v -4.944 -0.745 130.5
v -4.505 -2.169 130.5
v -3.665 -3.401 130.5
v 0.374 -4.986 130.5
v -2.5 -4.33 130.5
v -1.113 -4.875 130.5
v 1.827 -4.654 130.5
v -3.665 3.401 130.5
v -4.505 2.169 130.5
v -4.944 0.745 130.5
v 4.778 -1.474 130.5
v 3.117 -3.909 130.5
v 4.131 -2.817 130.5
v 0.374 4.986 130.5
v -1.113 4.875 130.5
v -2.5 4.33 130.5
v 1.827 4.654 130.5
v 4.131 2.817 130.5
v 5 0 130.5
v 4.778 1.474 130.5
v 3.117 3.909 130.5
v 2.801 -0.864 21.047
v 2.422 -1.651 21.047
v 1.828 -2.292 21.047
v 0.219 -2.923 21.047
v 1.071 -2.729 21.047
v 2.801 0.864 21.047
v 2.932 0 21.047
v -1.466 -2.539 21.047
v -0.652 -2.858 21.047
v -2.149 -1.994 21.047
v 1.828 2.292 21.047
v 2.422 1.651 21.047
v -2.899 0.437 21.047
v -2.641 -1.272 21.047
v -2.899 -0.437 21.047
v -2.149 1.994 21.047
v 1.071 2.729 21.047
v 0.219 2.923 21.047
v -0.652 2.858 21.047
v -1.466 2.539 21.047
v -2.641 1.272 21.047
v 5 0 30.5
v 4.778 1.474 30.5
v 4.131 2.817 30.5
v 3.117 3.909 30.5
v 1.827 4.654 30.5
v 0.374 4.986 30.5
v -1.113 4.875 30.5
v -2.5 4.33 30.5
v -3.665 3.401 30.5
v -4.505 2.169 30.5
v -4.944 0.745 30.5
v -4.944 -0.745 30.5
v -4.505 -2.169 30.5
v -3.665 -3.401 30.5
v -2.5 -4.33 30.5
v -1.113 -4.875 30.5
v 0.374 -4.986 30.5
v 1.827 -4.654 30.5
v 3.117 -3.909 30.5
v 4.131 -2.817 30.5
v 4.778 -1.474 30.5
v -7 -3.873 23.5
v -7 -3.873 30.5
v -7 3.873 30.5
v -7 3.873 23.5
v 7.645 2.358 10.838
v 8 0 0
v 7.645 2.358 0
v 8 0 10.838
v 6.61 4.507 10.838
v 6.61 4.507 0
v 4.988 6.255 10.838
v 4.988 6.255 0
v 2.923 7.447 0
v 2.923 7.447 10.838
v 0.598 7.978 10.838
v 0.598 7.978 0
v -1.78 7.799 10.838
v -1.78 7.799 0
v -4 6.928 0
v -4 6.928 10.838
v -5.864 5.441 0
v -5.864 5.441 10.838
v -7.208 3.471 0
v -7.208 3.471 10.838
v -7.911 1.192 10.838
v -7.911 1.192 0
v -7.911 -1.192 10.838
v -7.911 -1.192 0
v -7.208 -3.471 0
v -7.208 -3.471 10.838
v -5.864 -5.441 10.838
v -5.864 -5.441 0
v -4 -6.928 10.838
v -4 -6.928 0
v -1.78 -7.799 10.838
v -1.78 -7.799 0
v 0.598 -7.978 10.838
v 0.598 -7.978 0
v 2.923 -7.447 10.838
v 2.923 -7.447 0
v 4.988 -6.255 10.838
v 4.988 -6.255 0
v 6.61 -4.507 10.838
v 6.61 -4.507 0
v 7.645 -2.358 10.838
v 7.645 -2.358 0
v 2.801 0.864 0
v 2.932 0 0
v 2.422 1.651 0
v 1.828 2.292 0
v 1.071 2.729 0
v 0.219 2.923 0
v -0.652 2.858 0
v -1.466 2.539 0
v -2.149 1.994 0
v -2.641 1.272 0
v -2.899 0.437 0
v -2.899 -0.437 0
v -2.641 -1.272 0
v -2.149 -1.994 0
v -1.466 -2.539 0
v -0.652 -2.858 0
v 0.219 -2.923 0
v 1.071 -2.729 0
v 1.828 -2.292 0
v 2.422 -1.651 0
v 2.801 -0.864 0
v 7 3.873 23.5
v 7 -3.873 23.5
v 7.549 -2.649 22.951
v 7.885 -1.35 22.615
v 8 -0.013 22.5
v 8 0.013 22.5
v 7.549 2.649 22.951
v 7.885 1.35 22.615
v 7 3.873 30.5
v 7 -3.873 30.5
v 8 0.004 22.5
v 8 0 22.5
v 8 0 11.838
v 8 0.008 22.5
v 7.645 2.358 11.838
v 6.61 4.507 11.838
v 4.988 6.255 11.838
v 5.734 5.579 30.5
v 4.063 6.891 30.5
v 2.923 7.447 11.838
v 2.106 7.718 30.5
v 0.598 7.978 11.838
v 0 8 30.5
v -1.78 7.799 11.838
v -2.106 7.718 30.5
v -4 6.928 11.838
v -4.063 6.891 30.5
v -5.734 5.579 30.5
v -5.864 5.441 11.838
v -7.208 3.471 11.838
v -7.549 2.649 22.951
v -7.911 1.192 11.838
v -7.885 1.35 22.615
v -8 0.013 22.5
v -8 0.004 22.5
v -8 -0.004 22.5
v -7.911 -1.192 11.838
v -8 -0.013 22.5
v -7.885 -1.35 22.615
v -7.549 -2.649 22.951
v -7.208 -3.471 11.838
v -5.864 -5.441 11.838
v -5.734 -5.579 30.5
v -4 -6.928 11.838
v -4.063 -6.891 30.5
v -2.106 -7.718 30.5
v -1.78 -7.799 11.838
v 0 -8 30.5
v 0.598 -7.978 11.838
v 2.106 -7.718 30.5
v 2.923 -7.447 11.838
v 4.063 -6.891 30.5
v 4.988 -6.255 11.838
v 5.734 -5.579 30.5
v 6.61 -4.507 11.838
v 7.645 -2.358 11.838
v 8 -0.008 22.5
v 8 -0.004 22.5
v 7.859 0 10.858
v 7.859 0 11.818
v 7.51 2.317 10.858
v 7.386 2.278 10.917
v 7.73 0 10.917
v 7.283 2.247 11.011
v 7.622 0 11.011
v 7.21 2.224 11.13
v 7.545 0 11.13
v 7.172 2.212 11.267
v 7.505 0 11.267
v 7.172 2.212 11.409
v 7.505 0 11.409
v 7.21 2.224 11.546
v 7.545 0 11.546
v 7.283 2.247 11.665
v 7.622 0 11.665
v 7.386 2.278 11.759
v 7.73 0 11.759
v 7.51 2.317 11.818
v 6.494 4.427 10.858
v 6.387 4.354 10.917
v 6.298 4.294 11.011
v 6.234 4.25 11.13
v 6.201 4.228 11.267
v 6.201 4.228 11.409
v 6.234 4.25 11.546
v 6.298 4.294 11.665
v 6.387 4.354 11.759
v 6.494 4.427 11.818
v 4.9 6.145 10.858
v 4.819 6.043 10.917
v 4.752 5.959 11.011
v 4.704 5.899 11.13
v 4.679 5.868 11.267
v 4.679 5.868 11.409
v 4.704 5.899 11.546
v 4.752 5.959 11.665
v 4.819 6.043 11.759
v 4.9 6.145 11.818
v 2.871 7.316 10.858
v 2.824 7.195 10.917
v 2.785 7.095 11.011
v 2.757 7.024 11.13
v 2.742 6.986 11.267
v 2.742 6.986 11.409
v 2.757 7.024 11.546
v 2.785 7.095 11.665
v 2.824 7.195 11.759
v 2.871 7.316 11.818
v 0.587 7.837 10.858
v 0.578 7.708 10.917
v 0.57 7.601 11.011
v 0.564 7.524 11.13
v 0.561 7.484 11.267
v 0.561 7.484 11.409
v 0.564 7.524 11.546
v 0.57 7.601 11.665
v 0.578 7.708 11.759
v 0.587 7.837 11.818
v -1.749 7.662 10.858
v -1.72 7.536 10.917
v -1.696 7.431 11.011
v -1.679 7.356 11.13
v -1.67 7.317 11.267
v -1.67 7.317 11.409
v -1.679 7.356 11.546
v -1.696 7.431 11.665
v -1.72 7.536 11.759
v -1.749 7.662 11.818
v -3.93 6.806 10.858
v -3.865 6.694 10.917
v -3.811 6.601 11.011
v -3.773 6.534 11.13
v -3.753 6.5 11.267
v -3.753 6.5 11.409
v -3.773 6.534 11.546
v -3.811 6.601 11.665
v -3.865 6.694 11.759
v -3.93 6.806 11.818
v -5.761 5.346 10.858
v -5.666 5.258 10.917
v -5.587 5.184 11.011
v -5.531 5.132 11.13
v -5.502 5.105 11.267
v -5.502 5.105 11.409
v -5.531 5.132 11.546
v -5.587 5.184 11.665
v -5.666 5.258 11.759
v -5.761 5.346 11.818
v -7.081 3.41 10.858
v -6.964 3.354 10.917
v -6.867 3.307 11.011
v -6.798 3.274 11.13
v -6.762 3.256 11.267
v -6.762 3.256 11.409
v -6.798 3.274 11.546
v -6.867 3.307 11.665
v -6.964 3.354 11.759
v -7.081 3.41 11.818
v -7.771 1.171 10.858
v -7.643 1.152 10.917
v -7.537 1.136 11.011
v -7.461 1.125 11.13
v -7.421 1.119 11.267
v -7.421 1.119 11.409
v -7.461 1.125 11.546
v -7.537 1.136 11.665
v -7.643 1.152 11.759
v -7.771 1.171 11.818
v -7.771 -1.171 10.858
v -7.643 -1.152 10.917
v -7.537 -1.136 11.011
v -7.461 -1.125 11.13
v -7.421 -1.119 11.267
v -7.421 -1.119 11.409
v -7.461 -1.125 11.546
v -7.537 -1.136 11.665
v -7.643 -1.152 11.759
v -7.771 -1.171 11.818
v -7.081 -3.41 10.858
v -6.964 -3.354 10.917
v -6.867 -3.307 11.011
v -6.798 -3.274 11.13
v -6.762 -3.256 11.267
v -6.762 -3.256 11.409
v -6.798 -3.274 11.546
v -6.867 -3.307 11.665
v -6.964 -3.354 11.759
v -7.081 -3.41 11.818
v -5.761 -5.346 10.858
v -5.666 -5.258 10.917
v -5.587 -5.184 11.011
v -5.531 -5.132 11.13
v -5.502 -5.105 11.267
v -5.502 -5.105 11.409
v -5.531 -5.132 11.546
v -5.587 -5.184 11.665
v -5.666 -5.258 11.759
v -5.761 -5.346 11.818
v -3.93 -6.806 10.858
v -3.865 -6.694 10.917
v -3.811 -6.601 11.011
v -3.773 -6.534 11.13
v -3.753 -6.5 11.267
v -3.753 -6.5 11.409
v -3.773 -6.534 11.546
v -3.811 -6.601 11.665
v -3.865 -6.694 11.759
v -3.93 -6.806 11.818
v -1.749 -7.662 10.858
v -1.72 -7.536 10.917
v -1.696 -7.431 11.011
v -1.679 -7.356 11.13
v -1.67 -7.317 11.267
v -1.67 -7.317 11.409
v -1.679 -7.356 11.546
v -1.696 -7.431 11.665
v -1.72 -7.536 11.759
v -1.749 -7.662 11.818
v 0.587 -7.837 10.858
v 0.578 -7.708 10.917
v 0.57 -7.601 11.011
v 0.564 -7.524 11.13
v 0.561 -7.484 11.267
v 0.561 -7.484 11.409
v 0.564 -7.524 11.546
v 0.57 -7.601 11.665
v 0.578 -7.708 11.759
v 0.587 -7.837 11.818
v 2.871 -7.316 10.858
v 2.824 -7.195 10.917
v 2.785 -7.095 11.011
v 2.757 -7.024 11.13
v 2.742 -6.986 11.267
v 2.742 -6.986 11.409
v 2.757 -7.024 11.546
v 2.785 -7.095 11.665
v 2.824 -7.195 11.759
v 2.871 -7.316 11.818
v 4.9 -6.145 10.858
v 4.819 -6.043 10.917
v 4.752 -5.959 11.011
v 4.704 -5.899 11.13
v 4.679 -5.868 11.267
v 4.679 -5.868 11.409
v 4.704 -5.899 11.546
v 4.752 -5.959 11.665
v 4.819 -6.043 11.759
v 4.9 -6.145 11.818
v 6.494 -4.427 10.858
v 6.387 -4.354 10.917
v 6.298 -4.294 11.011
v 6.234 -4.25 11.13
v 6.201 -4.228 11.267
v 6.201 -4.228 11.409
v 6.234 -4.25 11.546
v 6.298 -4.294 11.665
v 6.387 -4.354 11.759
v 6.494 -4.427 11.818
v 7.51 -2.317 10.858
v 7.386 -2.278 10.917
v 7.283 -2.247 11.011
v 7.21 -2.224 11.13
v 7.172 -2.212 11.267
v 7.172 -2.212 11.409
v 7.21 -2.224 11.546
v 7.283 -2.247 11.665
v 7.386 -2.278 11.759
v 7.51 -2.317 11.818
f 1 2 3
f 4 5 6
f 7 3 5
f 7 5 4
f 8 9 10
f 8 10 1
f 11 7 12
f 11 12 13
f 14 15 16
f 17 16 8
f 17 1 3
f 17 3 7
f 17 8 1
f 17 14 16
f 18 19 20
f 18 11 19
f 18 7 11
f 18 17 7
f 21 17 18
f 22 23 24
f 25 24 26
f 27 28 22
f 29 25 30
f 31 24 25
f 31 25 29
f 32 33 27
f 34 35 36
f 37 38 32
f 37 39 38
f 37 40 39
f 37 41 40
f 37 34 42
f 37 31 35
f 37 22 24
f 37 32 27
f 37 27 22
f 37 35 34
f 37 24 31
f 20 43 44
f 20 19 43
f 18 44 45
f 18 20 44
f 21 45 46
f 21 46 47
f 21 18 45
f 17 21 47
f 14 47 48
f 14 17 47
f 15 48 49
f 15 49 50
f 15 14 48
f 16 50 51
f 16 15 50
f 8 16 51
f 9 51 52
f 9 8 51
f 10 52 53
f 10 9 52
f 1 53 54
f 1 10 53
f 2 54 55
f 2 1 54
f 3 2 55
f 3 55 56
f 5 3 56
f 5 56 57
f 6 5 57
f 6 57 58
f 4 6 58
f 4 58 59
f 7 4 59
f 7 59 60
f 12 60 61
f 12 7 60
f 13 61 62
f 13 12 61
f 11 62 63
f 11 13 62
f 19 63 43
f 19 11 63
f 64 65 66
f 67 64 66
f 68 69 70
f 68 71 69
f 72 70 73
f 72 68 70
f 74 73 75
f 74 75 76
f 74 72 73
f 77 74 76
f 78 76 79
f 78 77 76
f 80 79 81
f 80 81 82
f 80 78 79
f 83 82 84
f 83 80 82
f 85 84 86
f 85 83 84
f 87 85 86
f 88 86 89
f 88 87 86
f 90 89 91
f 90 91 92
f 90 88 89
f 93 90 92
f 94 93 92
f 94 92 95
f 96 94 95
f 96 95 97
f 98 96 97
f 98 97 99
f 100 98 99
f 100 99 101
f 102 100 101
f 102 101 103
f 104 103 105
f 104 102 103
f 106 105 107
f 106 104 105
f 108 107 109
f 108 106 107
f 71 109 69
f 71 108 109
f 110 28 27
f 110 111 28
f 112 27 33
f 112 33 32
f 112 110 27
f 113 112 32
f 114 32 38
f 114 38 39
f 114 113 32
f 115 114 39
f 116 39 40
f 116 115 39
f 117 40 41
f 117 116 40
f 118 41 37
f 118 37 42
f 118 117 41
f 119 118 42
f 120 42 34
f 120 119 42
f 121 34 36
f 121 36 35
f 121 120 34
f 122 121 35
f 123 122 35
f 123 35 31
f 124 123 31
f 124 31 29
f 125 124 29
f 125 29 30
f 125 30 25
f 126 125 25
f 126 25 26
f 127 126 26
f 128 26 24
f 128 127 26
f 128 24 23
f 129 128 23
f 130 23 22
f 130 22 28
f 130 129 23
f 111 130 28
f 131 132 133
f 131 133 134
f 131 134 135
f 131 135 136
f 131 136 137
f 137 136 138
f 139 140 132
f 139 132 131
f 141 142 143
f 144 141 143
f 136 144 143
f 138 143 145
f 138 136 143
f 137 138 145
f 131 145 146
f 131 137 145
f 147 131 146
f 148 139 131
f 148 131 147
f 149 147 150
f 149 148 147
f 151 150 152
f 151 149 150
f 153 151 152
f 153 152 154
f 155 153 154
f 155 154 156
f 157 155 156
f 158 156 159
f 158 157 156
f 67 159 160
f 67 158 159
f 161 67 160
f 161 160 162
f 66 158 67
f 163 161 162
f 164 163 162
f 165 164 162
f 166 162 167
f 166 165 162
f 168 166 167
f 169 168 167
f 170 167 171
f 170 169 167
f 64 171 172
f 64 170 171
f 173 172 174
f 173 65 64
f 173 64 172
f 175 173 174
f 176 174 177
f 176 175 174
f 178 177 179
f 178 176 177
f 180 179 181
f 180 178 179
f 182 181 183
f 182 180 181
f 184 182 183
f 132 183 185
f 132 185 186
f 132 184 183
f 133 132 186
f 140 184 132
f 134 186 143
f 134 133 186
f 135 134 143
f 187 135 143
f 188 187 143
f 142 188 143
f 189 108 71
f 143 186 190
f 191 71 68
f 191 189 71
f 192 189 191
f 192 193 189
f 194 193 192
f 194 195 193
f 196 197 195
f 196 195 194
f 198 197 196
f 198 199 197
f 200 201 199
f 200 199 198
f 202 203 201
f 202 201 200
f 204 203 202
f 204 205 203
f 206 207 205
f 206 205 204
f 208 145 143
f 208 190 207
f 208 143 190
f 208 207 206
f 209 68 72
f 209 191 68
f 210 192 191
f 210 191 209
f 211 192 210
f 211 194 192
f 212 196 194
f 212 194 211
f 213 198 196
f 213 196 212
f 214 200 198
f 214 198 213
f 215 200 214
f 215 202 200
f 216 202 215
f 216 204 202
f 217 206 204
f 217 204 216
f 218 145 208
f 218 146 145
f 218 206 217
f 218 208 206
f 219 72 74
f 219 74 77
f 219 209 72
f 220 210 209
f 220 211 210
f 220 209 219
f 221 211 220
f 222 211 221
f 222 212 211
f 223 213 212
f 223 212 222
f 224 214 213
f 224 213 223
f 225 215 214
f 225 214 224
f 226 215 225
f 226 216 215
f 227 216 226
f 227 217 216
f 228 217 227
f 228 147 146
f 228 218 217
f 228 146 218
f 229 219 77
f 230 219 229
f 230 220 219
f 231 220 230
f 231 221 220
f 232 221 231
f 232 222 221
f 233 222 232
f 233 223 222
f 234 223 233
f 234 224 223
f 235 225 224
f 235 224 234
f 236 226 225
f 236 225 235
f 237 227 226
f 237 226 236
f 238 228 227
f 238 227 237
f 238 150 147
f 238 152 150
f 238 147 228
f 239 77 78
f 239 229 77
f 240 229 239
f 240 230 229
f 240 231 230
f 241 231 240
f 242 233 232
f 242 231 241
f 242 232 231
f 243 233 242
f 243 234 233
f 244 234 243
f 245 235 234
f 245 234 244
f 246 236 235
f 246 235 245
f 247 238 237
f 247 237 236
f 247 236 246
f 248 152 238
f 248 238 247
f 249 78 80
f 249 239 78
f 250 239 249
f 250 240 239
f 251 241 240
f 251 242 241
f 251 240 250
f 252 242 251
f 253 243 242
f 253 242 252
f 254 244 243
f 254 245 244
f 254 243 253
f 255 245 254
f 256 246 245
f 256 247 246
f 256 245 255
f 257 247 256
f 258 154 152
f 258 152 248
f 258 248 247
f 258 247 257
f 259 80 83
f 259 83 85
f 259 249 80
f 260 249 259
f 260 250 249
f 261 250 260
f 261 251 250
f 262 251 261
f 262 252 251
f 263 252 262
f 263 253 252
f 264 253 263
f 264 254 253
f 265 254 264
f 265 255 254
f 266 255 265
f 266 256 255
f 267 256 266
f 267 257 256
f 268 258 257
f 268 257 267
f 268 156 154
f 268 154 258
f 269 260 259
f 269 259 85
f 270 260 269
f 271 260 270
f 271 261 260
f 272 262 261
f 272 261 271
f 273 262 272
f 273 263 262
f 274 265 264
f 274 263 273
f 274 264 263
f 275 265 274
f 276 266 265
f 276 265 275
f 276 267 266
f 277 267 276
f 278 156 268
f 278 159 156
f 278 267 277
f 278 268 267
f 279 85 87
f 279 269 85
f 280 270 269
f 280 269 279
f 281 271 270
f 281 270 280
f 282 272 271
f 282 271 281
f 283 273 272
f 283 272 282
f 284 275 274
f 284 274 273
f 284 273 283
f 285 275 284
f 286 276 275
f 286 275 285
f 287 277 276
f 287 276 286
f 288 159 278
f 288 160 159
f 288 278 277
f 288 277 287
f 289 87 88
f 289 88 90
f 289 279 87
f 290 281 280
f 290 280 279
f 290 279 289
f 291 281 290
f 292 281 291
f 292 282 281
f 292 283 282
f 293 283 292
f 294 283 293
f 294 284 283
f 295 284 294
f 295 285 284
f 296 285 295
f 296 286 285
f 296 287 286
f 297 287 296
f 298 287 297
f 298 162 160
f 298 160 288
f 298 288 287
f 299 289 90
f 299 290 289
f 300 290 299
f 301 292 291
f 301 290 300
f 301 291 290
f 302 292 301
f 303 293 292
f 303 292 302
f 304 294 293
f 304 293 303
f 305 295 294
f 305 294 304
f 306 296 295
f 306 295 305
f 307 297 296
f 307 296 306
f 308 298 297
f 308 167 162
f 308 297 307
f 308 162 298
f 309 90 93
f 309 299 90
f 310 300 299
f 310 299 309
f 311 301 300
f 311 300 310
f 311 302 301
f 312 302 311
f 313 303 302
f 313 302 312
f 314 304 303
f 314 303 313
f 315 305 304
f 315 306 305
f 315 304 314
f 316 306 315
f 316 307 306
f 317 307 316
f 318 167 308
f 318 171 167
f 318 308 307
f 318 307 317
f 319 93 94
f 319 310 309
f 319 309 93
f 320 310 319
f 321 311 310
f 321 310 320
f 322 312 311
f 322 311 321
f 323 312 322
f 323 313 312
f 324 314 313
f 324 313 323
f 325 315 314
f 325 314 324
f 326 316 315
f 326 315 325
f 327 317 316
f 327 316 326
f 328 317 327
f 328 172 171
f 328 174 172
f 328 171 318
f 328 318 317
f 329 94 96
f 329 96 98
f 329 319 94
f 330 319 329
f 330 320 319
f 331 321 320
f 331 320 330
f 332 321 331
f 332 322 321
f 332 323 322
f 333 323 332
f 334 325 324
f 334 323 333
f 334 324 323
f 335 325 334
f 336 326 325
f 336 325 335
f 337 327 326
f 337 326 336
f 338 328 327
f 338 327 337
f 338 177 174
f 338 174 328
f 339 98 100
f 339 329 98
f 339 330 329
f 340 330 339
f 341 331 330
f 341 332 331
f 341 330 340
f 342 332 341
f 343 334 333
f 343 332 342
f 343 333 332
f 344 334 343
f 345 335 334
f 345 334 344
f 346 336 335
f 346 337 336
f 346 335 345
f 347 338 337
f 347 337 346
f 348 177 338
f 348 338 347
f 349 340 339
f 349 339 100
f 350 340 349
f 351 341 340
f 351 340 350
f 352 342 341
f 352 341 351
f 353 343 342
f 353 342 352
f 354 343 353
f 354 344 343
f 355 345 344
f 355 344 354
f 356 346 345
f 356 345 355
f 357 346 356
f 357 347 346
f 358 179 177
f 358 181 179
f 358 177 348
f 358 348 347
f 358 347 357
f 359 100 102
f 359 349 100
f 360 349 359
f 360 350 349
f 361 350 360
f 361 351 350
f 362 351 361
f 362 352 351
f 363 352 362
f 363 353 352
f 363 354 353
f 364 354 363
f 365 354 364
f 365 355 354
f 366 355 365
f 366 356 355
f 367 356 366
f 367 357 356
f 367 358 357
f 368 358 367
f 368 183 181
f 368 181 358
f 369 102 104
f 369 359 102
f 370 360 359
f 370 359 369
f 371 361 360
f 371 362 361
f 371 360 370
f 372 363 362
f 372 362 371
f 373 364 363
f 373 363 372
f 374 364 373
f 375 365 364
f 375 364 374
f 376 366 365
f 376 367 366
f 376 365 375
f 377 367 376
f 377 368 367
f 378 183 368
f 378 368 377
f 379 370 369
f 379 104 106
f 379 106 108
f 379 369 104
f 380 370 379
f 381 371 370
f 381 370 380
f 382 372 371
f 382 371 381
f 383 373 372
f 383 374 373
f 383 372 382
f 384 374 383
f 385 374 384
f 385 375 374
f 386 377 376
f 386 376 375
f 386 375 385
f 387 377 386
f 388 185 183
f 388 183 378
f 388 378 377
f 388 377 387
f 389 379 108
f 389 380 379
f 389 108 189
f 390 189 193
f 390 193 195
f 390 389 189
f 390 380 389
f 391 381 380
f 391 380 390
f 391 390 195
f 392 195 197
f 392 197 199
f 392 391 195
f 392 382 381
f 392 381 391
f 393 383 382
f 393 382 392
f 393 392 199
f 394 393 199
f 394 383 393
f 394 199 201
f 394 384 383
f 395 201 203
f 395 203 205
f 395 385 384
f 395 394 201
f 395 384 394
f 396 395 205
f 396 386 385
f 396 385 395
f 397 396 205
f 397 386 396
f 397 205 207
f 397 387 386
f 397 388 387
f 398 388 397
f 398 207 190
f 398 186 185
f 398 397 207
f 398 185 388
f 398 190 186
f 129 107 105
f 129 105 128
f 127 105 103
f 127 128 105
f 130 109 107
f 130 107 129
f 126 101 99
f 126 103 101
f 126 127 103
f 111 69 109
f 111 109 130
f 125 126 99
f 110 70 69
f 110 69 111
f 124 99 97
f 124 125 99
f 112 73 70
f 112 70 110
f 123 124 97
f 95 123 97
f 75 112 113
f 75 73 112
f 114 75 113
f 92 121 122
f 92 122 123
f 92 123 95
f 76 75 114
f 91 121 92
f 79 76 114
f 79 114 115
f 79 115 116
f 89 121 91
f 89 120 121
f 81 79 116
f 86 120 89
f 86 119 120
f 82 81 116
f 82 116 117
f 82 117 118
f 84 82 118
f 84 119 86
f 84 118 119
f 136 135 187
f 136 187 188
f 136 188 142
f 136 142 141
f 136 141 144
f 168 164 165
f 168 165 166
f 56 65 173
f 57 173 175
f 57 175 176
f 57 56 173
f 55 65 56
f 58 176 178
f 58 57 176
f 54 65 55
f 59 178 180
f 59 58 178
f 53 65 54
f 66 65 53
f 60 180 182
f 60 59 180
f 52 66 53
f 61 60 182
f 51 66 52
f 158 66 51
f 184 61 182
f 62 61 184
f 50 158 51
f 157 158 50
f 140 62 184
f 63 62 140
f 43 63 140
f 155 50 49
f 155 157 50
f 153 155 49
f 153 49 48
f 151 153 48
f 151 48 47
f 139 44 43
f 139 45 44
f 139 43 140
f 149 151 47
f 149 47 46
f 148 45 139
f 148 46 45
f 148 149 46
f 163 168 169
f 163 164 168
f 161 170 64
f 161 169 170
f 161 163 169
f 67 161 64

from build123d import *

# Parameters (mm, degrees)
F2_W     = 19.6017324924
F2_H     = 37.1457748115
F2_W_2   = 14
F2_H_2   = 30
F3_DEPTH = 8
F4_SIZE  = 0.99999


# Not quite as in the source:
# - a fillet or chamfer is up to 0.001 mm smaller than in the source, because OpenCascade refuses the exact size


with BuildPart() as f1:
    # F0 (on Front) → F1 (revolve)
    with BuildSketch(Plane.XZ):
        with BuildLine():
            Line((2.9315422289, 21.0469197482), (2.9315422289, 0))
            Line((2.9315422289, 0), (8, 0))
            Line((8, 0), (8, 10.8380244002))
            ThreePointArc((8, 10.8380244002), (7.5, 11.3380244002), (8, 11.8380244002))
            Line((8, 11.8380244002), (8, 30.5))
            Line((8, 30.5), (5, 30.5))
            Line((5, 30.5), (5, 130.5))
            Line((5, 130.5), (0, 130.5))
            Line((0, 130.5), (0, 30.5))
            Line((0, 30.5), (0, 21.0469197482))
            Line((0, 21.0469197482), (2.9315422289, 21.0469197482))
        make_face()
    revolve(axis=Axis((0, 0, 80.5), (0, 0, 1)))

    # F2 (on face) → F3 (cut)
    with BuildSketch(Plane.XY.offset(30.5)):
        Rectangle(F2_W, F2_H)
        Rectangle(F2_W_2, F2_H_2, mode=Mode.SUBTRACT)
    extrude(amount=-F3_DEPTH, mode=Mode.SUBTRACT)

    # F4 (size 1 in the source; OpenCascade refuses exactly that, so slightly less here)
    f4_edges = [f1.edges().sort_by_distance(p)[0] for p in [
        (-7, 0, 22.5),
        (7, 0, 22.5),
    ]]
    chamfer(f4_edges, length=F4_SIZE)


solid = f1.part
